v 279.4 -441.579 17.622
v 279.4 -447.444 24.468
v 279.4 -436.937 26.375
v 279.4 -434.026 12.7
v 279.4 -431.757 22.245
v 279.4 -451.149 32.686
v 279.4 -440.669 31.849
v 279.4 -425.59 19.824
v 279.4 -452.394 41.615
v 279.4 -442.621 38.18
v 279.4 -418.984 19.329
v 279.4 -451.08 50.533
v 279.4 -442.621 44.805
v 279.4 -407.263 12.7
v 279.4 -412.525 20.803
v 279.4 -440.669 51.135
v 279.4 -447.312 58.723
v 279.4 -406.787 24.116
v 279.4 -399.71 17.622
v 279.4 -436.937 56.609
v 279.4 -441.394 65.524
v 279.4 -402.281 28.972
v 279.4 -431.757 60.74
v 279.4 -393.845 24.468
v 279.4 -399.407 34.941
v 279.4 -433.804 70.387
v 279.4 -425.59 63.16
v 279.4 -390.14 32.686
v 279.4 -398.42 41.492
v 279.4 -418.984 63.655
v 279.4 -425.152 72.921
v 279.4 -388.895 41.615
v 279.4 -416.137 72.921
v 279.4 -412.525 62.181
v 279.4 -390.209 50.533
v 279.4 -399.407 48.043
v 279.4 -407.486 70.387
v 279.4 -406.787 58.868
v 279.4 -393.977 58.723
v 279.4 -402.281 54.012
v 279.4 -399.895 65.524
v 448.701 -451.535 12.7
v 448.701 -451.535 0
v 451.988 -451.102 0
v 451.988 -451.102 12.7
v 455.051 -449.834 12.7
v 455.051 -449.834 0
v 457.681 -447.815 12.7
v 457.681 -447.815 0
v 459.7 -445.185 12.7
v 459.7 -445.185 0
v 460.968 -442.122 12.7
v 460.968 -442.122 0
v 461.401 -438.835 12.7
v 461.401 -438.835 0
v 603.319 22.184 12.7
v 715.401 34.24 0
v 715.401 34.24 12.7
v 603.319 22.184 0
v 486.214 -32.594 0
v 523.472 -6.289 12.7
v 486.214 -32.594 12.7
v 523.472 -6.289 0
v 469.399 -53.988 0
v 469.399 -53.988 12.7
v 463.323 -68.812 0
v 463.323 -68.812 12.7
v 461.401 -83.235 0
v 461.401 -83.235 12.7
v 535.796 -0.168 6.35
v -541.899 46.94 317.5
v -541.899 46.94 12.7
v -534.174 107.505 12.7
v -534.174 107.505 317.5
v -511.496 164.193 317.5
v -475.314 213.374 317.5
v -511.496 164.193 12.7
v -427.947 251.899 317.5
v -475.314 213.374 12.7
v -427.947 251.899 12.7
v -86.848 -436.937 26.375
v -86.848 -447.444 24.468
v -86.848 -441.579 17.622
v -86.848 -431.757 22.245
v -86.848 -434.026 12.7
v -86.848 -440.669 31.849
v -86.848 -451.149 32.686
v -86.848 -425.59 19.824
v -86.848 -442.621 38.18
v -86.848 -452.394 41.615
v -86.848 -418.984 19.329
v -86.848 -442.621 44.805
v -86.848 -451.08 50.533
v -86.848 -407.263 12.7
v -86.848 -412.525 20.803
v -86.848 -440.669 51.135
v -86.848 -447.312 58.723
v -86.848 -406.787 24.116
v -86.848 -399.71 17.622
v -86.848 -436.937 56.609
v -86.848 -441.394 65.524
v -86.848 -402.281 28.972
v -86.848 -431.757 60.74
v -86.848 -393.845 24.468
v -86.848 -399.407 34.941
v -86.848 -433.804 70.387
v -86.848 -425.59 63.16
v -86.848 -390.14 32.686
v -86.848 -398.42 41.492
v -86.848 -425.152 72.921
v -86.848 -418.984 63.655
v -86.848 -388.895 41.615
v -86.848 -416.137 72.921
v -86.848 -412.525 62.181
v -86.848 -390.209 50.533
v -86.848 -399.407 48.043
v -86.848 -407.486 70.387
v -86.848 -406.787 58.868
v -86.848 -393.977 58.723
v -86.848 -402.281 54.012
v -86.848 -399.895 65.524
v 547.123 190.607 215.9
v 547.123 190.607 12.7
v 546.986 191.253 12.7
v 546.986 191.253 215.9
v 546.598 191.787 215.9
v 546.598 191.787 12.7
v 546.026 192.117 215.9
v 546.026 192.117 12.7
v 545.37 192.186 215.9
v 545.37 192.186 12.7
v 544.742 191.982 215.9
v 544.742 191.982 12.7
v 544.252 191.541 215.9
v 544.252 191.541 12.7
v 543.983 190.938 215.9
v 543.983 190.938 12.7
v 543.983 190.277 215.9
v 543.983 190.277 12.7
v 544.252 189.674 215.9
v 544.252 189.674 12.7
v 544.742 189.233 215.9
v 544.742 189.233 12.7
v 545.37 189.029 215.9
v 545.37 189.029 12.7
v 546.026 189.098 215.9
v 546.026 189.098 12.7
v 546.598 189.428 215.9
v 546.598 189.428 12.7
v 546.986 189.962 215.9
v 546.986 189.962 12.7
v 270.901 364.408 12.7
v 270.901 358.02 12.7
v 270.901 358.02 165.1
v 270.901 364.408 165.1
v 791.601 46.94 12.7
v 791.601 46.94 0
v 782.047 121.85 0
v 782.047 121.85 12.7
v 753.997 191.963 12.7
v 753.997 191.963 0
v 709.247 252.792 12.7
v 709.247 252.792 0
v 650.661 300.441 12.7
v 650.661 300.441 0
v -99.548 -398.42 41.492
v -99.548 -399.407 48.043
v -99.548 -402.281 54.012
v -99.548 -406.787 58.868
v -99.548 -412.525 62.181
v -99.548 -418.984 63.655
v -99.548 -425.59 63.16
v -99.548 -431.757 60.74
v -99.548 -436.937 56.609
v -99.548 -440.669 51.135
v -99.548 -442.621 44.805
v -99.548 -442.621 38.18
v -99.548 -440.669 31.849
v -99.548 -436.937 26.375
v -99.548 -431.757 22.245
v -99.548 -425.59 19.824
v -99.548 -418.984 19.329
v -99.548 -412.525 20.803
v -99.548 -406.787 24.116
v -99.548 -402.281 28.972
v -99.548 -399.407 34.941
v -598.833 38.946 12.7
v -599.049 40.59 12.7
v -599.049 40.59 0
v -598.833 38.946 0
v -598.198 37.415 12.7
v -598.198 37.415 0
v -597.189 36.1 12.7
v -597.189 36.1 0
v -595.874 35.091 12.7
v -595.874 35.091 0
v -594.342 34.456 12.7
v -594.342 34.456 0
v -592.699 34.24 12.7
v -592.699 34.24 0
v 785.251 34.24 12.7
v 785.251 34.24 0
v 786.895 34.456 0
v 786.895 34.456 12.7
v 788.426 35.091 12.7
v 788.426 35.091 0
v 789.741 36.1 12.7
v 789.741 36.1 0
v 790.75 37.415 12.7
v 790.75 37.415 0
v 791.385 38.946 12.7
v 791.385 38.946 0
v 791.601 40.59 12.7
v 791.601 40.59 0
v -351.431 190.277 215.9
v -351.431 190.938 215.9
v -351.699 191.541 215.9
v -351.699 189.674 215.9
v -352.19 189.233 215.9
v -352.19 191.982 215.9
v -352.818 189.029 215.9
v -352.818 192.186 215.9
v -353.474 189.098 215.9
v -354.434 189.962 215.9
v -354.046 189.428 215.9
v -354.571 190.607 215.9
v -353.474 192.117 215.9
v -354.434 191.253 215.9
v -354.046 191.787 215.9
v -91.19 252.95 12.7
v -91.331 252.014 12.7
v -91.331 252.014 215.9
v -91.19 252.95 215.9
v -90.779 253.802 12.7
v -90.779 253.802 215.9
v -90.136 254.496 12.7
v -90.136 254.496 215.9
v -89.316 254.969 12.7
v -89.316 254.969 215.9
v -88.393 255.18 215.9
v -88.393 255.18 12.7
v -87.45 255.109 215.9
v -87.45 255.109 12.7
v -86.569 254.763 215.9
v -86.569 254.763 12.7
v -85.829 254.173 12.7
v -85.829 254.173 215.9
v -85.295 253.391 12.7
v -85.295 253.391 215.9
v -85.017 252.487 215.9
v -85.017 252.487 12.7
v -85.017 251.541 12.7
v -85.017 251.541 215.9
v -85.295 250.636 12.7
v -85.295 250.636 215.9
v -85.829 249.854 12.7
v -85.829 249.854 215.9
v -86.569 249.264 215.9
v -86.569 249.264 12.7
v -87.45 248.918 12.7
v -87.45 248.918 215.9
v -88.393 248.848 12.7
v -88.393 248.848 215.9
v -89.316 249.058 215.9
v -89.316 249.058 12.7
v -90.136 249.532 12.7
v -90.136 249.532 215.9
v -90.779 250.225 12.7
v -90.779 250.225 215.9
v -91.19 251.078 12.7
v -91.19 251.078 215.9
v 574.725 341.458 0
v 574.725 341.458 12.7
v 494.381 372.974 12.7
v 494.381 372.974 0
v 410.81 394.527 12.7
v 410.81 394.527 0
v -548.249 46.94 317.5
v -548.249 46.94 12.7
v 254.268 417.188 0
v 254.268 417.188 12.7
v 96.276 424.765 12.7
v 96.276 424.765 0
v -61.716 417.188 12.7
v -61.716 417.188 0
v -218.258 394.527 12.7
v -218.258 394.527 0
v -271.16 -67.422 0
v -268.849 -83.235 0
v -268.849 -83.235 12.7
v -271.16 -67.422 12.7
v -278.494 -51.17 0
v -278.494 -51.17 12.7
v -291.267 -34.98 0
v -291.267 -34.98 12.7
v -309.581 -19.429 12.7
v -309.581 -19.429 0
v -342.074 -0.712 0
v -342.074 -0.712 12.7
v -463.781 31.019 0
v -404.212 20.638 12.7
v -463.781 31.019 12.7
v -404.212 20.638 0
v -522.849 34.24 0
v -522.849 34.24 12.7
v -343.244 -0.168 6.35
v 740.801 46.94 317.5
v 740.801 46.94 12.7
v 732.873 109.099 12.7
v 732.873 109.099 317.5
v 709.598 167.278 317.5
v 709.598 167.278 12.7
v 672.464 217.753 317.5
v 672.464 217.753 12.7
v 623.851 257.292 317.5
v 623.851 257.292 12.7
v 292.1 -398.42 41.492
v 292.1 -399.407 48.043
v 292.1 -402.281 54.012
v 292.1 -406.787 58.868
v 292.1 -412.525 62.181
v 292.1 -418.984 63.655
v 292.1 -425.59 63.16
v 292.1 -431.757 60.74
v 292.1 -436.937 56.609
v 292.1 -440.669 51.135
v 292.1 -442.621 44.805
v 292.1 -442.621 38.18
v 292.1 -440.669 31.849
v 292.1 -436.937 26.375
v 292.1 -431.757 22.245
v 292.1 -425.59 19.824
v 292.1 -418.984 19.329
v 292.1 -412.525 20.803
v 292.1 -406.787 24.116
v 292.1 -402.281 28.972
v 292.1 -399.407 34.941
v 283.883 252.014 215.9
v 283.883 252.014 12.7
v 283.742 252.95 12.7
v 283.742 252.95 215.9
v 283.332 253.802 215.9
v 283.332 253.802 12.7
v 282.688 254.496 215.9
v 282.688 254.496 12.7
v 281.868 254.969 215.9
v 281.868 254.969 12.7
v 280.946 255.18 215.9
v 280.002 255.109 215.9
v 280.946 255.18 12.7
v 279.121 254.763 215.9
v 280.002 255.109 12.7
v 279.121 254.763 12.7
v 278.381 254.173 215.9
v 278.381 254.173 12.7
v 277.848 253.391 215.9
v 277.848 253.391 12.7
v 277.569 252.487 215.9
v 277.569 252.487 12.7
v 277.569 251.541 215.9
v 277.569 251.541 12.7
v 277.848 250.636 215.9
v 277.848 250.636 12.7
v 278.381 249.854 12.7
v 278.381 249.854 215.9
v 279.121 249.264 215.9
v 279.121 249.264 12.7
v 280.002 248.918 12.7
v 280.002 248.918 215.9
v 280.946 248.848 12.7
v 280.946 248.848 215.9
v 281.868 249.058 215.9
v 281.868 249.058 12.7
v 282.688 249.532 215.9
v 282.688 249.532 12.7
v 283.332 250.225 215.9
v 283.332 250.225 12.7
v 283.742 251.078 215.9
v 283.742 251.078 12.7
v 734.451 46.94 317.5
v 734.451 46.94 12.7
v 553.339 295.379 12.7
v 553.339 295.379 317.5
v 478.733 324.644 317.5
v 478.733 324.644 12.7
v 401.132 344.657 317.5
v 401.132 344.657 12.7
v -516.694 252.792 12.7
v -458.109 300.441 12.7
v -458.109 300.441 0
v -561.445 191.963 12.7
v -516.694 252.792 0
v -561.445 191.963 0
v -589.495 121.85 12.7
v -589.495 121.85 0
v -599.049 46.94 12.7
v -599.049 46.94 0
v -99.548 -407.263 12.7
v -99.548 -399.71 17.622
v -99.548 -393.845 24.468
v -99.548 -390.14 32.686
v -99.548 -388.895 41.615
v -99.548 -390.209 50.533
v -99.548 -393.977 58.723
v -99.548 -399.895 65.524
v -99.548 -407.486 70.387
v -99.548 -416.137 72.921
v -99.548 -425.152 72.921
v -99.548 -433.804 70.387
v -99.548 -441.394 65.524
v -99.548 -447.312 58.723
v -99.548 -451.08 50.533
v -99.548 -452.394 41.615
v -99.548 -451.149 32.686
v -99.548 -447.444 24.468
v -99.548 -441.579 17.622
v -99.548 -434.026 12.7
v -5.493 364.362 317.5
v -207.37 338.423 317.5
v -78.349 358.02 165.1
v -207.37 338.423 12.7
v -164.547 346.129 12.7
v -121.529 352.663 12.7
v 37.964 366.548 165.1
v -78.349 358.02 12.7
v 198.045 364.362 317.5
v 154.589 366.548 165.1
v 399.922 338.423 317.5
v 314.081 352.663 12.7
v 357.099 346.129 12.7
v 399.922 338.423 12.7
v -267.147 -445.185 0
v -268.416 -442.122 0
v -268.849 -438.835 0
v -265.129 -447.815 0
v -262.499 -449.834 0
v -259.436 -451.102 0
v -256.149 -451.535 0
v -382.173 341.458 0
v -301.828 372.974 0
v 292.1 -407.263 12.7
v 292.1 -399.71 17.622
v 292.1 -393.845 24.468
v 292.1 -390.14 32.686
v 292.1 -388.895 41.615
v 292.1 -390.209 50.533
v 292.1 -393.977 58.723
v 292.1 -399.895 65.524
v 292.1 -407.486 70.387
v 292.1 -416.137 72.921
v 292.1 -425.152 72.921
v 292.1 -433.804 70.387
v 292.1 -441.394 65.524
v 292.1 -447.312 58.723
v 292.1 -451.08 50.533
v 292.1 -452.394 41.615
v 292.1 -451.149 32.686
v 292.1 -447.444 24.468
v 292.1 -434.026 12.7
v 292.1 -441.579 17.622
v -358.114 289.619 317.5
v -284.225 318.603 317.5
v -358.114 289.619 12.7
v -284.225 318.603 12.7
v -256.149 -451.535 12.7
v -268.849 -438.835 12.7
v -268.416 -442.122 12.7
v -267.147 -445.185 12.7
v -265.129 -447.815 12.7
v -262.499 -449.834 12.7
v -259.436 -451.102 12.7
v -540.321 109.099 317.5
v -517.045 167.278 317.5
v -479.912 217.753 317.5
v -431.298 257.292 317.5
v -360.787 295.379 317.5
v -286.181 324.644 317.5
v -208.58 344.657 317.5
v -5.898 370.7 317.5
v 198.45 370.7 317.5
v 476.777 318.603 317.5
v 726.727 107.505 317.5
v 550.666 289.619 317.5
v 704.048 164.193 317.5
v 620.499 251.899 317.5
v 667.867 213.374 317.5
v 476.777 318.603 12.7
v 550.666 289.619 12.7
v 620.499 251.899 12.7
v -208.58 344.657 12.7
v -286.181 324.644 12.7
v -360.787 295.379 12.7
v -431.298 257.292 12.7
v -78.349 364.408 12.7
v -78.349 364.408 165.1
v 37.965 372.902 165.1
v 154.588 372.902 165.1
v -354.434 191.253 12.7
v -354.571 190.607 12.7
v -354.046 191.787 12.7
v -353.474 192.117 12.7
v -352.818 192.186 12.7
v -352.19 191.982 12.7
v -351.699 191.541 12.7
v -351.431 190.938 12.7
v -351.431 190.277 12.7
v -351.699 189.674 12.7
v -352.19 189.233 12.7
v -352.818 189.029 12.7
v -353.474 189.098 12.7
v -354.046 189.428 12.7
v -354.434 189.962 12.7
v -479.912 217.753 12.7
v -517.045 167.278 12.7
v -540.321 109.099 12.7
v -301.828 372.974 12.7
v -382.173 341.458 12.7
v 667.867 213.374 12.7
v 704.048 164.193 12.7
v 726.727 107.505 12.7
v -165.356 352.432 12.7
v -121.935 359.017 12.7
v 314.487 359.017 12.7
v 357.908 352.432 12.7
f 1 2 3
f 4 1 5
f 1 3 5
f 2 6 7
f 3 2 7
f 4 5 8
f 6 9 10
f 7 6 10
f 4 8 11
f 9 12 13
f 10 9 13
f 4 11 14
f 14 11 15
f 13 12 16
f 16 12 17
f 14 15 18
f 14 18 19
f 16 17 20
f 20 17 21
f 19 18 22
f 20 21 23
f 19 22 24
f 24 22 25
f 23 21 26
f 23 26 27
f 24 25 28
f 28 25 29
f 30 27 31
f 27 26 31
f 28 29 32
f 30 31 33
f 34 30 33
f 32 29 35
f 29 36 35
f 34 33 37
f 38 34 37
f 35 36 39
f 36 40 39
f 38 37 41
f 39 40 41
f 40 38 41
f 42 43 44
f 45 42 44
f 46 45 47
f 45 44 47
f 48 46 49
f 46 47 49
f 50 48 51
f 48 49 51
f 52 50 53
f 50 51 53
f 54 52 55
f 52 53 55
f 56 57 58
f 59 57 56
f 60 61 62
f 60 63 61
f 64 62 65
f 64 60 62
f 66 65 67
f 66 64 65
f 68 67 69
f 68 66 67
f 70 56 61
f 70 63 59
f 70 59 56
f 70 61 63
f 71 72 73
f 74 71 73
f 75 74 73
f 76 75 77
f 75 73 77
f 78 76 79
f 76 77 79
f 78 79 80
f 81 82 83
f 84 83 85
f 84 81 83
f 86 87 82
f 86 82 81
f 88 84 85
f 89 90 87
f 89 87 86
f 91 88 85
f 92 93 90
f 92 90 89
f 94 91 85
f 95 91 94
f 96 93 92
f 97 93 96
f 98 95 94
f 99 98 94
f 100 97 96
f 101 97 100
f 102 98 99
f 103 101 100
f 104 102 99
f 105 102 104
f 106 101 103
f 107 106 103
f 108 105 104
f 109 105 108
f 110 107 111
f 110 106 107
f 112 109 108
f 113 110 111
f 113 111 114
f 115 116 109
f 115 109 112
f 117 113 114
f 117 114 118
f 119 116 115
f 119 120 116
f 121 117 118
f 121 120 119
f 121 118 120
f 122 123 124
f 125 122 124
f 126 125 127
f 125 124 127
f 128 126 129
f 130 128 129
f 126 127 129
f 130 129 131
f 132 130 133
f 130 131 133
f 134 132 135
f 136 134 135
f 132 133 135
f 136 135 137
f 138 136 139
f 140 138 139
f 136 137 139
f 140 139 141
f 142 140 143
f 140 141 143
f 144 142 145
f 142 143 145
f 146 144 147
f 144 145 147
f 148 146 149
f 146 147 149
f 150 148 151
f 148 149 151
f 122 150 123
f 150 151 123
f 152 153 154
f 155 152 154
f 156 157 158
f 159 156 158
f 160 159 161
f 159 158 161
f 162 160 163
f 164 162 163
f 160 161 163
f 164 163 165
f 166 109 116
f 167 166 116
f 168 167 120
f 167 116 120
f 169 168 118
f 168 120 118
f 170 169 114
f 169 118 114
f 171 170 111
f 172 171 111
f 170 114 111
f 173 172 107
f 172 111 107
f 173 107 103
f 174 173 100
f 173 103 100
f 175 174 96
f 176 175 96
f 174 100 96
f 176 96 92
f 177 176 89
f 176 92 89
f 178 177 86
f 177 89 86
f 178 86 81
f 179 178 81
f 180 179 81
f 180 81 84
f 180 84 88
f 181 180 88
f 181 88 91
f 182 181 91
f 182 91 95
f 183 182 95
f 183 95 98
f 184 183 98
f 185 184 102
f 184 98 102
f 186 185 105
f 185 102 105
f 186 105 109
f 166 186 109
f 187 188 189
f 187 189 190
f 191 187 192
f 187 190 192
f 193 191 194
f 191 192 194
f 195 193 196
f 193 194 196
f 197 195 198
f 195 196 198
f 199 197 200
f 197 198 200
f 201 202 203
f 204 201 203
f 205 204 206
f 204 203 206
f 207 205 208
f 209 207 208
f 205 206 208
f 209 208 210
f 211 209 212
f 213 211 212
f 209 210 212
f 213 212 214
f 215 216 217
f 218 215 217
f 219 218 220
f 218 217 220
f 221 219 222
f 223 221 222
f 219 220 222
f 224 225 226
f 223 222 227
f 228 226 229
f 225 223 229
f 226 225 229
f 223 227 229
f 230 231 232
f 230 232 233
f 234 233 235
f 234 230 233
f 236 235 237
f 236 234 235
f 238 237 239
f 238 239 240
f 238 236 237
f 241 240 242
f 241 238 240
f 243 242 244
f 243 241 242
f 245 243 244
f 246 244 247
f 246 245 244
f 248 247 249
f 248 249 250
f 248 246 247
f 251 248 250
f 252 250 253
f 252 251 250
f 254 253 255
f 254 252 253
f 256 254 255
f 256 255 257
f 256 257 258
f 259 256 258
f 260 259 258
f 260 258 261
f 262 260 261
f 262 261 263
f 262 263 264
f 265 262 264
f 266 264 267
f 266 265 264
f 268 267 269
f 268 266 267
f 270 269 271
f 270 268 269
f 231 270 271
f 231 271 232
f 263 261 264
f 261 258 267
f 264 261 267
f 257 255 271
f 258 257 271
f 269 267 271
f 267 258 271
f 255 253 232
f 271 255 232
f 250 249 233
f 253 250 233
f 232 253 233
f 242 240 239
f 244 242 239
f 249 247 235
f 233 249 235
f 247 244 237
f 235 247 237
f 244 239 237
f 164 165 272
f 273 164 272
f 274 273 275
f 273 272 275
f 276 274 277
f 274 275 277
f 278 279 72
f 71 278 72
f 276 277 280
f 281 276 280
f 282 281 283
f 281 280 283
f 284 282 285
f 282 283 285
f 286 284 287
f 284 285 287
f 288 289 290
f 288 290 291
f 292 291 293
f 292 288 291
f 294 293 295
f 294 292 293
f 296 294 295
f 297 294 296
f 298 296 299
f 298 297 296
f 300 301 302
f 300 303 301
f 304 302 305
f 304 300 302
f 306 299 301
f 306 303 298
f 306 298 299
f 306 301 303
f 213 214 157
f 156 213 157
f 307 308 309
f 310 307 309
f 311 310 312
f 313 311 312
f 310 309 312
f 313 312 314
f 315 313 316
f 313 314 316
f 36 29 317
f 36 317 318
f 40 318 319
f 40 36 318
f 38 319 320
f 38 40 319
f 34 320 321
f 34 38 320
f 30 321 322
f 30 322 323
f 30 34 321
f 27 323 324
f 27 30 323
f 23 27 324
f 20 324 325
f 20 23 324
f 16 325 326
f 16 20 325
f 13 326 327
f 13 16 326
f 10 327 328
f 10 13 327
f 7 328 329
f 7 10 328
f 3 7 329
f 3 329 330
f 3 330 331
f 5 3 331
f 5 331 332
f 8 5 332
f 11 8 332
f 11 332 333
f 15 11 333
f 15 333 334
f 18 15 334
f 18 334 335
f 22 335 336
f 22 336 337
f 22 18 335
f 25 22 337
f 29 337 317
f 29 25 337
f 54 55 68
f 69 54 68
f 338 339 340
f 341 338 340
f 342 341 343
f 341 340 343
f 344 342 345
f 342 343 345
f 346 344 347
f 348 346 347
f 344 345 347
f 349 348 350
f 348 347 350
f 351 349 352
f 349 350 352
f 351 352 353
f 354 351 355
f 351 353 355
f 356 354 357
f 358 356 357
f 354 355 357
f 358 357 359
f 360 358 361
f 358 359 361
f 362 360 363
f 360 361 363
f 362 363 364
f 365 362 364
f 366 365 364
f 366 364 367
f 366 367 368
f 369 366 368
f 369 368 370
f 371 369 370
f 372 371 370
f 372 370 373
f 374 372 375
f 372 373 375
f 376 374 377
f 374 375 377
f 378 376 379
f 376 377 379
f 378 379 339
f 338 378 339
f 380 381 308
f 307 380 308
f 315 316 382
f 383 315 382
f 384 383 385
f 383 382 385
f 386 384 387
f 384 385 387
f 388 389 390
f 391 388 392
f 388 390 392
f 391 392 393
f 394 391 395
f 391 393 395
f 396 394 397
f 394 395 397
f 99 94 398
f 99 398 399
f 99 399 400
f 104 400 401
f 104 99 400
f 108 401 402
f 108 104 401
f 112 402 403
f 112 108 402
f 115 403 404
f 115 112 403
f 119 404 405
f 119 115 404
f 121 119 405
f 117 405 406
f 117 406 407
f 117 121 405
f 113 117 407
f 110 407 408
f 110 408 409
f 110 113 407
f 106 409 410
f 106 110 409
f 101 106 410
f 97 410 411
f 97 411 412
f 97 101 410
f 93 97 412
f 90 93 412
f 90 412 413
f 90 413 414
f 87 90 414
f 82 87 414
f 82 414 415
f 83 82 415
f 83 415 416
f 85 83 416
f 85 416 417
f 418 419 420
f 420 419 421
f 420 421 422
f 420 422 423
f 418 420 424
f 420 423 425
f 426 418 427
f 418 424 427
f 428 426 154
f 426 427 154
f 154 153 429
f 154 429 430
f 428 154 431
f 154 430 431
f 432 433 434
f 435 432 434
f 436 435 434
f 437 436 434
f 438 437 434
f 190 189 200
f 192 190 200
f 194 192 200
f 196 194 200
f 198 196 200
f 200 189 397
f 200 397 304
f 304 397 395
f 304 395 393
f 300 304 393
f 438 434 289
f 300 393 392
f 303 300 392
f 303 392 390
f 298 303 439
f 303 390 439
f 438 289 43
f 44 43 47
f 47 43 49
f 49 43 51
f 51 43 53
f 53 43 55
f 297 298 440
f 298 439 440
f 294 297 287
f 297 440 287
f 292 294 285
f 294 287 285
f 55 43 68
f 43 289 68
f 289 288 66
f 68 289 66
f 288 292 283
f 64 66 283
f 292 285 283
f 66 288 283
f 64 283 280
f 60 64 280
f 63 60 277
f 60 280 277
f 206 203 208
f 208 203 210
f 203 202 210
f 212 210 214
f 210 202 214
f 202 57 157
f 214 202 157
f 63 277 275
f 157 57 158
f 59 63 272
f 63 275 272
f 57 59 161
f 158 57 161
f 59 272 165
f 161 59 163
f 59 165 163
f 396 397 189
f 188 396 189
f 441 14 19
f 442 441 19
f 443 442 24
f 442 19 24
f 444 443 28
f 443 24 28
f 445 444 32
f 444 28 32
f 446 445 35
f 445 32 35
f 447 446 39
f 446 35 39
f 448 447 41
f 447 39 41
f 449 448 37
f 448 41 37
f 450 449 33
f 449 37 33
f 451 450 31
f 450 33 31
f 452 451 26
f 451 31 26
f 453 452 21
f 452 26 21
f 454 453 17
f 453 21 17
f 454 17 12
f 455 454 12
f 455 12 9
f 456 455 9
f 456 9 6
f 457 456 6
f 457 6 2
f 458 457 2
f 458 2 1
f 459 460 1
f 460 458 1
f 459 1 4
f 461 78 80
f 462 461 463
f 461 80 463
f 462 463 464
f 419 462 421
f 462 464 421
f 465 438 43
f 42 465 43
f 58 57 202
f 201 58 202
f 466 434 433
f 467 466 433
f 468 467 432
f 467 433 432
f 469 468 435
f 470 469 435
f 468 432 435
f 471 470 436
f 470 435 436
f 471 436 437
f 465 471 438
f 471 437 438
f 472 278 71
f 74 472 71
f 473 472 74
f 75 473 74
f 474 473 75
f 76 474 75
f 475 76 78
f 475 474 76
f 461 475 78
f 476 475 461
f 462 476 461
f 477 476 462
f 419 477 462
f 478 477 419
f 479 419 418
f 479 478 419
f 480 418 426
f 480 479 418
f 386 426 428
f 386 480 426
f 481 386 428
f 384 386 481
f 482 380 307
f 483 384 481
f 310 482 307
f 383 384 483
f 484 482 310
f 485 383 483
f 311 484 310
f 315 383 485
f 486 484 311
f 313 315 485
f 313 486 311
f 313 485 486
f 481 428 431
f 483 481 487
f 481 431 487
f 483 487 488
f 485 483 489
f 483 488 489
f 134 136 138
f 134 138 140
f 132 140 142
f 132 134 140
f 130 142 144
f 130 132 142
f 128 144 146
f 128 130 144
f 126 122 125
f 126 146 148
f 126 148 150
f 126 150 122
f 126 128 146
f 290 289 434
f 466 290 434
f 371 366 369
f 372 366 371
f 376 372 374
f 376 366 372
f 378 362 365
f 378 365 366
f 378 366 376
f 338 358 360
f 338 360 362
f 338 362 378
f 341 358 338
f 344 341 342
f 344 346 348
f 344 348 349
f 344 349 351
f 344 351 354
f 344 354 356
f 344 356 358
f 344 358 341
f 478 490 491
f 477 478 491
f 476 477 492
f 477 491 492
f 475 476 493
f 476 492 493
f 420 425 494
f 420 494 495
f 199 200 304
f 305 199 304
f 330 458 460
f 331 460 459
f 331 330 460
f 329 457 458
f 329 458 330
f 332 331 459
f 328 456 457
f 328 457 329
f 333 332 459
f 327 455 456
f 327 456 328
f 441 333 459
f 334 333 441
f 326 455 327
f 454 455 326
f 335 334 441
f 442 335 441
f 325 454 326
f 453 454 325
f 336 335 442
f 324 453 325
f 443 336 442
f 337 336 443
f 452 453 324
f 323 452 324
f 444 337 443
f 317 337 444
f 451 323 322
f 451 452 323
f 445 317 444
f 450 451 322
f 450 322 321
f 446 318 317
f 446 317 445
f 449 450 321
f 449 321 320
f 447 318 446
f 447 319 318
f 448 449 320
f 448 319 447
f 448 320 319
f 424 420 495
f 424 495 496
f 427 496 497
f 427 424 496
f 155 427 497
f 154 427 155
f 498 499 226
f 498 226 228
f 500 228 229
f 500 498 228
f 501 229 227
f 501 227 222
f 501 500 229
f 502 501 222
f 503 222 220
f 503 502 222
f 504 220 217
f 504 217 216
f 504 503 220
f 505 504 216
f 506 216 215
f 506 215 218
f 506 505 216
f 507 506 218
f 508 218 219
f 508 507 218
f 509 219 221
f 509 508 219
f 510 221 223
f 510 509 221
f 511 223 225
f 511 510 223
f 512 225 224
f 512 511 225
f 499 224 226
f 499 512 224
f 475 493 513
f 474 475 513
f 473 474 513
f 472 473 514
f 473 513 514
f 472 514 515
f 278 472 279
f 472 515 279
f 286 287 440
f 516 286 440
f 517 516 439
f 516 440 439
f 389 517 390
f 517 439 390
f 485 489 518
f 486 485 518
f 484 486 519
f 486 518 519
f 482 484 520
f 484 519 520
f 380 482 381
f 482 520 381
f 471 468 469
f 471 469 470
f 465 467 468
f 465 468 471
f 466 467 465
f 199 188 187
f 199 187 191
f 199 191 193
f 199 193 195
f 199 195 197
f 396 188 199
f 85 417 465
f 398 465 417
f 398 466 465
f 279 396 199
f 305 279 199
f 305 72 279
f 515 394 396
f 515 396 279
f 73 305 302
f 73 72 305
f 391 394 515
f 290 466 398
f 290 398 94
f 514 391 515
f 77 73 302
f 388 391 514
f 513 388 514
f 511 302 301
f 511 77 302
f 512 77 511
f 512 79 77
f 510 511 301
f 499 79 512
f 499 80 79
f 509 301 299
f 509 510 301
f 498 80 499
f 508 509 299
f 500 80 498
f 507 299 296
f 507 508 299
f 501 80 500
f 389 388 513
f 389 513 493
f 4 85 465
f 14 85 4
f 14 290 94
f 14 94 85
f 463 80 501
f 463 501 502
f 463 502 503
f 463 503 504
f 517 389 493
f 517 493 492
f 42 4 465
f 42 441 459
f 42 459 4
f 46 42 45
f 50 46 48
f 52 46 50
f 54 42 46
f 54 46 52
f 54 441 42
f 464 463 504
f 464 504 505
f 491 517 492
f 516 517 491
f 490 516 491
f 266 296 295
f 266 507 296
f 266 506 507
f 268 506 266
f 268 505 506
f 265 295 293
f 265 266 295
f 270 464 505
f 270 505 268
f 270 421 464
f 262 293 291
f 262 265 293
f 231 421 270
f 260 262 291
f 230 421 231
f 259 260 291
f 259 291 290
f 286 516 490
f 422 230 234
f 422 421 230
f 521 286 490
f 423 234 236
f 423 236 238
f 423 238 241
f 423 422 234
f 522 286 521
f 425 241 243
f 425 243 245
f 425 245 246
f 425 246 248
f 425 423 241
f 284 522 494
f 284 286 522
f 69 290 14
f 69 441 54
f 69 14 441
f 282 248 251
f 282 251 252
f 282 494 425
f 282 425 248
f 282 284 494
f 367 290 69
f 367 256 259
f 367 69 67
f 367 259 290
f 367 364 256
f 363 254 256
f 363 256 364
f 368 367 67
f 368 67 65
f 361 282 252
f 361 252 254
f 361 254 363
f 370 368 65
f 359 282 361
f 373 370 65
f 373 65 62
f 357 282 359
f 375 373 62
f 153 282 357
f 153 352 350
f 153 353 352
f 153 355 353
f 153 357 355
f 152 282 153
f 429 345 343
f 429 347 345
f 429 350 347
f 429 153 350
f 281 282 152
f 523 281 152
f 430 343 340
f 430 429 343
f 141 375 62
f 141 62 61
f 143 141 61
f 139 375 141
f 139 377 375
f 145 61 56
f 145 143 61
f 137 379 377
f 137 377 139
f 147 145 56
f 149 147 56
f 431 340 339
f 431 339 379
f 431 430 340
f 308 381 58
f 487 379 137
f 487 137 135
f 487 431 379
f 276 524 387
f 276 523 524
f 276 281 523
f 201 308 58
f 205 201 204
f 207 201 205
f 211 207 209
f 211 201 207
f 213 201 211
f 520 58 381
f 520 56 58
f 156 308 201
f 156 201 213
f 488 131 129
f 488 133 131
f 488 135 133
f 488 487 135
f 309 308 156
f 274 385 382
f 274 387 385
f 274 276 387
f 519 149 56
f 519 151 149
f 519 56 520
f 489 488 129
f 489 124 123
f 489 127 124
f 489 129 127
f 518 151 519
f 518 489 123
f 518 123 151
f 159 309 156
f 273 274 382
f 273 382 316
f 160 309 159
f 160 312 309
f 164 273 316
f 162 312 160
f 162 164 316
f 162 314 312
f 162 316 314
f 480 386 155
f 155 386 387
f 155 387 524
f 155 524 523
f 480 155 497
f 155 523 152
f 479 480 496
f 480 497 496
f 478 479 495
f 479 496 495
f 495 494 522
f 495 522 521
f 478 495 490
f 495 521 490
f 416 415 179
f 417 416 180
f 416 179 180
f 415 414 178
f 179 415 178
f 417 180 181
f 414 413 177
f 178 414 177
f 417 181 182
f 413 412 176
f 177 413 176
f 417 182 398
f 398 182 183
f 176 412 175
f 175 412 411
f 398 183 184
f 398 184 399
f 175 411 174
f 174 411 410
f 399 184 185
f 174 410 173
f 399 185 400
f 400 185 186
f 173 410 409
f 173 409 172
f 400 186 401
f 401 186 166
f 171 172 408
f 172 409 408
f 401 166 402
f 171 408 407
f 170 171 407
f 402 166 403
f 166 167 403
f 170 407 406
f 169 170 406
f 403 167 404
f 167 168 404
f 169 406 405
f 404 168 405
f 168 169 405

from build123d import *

# Parameters (mm, degrees)
F1_DEPTH  = 12.7
F3_R      = 31.75
F3_R_2    = 22.225
F4_DEPTH  = 12.7
F5_R      = 1.5875
F5_R_2    = 3.175
F6_DEPTH  = 203.2
F10_DEPTH = 304.8
F11_W     = 349.25
F11_H     = 152.4
F12_DEPTH = 876.3010001


# Not quite as in the source:
# - ends of sketch curves that miss each other by under 0.0002 mm in the source are joined
# - a feature of the source that left no trace in its solid (it failed there, or was rolled back) is left out
# - a pattern or mirror of a feature is missing from the dataset's text; its kind, count and spacing are read off the source's solid


with BuildPart() as f1:
    # F0 (on Top) → F1 (new body)
    with BuildSketch(Plane.XY):
        with BuildLine():
            Line((-599.0488908, 46.9398096), (-599.0488908, 40.5898096))
            ThreePointArc((-599.0488908, 40.5898096), (-597.1890188605, 36.0996815395), (-592.6988908, 34.2398096))
            Line((-592.6988908, 34.2398096), (-522.8488908, 34.2398096))
            add(Edge.make_bspline(
                [(-268.8488908, -83.2351904), (-268.8488908, 34.2397712098), (-522.8488908, 34.2398096)],
                knots=[0, 0, 0, 1.570796, 1.570796, 1.570796], degree=2, weights=[1, 0.7071068967, 1]))
            Line((-268.8488908, -83.2351904), (-268.8488908, -438.8351904))
            ThreePointArc((-268.8488908, -438.8351904), (-265.1291469211, -447.8154465211), (-256.1488908, -451.5351904))
            Line((-256.1488908, -451.5351904), (448.7011092, -451.5351904))
            ThreePointArc((448.7011092, -451.5351904), (457.6813653211, -447.8154465211), (461.4011092, -438.8351904))
            Line((461.4011092, -438.8351904), (461.4011092, -83.2351904))
            add(Edge.make_bspline(
                [(715.4011042177, 34.2398096), (461.4011872236, 34.2398072957), (461.4011092, -83.2351904)],
                knots=[4.712389, 4.712389, 4.712389, 6.283185, 6.283185, 6.283185], degree=2, weights=[1, 0.7071068967, 1]))
            Line((715.4011042177, 34.2398096), (785.2511092, 34.2398096))
            ThreePointArc((785.2511092, 34.2398096), (789.7412372605, 36.0996815395), (791.6011092, 40.5898096))
            Line((791.6011092, 40.5898096), (791.6011092, 46.9398096))
            ThreePointArc((791.6011092, 46.9398096), (753.9970119259, 191.9633164225), (650.6608007323, 300.4414852816))
            ThreePointArc((650.6608007323, 300.4414852816), (535.0314824748, 358.4359268507), (410.8101236244, 394.5267587894))
            ThreePointArc((410.8101236244, 394.5267587894), (96.2761092, 424.7648096), (-218.2579085609, 394.5267759822))
            ThreePointArc((-218.2579085609, 394.5267759822), (-342.4792640748, 358.4359268507), (-458.1085745053, 300.4414726845))
            ThreePointArc((-458.1085745053, 300.4414726845), (-561.4447935259, 191.9633164225), (-599.0488908, 46.9398096))
        make_face()
    extrude(amount=F1_DEPTH)

    # F3 (on offset) → F4 (join)
    with BuildSketch(Plane.YZ.offset(279.4)):
        with Locations((-420.6445217133, 41.4921417832)):
            Circle(F3_R)
        with Locations((-420.6445217133, 41.4921417832)):
            Circle(F3_R_2, mode=Mode.SUBTRACT)
    f4 = extrude(amount=F4_DEPTH)

    # F4_copies: F4 across plane
    add(f4.mirror(Plane(origin=(96.276109, 0, 0), x_dir=(0, 0, -1), z_dir=(-1, 0, 0))))

    # F5 (on face) → F6 (join)
    with BuildSketch(Plane.XY.offset(12.7)):
        with Locations((545.5359220505, 190.6074881554)):
            Circle(F5_R)
        with Locations((280.7082656561, 252.0138544033)):
            Circle(F5_R_2)
    f6 = extrude(amount=F6_DEPTH)

    # F6_copies: F6 across plane
    add(f6.mirror(Plane(origin=(96.276109, 0, 0), x_dir=(0, 0, -1), z_dir=(-1, 0, 0))))

    # F9 (on face) → F10 (join)
    with BuildSketch(Plane.XY.offset(12.7)):
        with BuildLine():
            Line((734.4511103495, 46.9398096), (740.8011092, 46.9398096))
            ThreePointArc((740.8011092, 46.9398096), (709.5977093343, 167.2784641974), (623.8506404715, 257.292263889))
            ThreePointArc((623.8506404715, 257.292263889), (516.4805587409, 311.1442444042), (401.1321540941, 344.6571597759))
            ThreePointArc((401.1321540941, 344.6571597759), (96.2761092, 373.9648096), (-208.5799387837, 344.6571770166))
            ThreePointArc((-208.5799387837, 344.6571770166), (-323.9283403409, 311.1442444042), (-431.2984143121, 257.2922512499))
            ThreePointArc((-431.2984143121, 257.2922512499), (-517.0454909343, 167.2784641974), (-548.2488908, 46.9398096))
            Line((-548.2488908, 46.9398096), (-541.8989002521, 46.9398096))
            ThreePointArc((-541.8989002521, 46.9398096), (-511.4955863715, 164.1928622622), (-427.9471570273, 251.8986192435))
            ThreePointArc((-427.9471570273, 251.8986192435), (-321.6094769175, 305.2327893075), (-207.3701905688, 338.4234653923))
            ThreePointArc((-207.3701905688, 338.4234653923), (96.2761092, 367.6148096), (399.9224109615, 338.4234771459))
            ThreePointArc((399.9224109615, 338.4234771459), (514.1616980249, 305.2327962096), (620.4993695539, 251.8986096209))
            ThreePointArc((620.4993695539, 251.8986096209), (704.047797515, 164.1928582278), (734.4511103495, 46.9398096))
        make_face()
    extrude(amount=F10_DEPTH)

    # F11 (on face) → F12 (cut, through all)
    with BuildSketch(Plane.XZ.offset(451.5351904)):
        with Locations((96.2761092, 88.9)):
            Rectangle(F11_W, F11_H)
    extrude(amount=-F12_DEPTH, mode=Mode.SUBTRACT)


solid = f1.part
